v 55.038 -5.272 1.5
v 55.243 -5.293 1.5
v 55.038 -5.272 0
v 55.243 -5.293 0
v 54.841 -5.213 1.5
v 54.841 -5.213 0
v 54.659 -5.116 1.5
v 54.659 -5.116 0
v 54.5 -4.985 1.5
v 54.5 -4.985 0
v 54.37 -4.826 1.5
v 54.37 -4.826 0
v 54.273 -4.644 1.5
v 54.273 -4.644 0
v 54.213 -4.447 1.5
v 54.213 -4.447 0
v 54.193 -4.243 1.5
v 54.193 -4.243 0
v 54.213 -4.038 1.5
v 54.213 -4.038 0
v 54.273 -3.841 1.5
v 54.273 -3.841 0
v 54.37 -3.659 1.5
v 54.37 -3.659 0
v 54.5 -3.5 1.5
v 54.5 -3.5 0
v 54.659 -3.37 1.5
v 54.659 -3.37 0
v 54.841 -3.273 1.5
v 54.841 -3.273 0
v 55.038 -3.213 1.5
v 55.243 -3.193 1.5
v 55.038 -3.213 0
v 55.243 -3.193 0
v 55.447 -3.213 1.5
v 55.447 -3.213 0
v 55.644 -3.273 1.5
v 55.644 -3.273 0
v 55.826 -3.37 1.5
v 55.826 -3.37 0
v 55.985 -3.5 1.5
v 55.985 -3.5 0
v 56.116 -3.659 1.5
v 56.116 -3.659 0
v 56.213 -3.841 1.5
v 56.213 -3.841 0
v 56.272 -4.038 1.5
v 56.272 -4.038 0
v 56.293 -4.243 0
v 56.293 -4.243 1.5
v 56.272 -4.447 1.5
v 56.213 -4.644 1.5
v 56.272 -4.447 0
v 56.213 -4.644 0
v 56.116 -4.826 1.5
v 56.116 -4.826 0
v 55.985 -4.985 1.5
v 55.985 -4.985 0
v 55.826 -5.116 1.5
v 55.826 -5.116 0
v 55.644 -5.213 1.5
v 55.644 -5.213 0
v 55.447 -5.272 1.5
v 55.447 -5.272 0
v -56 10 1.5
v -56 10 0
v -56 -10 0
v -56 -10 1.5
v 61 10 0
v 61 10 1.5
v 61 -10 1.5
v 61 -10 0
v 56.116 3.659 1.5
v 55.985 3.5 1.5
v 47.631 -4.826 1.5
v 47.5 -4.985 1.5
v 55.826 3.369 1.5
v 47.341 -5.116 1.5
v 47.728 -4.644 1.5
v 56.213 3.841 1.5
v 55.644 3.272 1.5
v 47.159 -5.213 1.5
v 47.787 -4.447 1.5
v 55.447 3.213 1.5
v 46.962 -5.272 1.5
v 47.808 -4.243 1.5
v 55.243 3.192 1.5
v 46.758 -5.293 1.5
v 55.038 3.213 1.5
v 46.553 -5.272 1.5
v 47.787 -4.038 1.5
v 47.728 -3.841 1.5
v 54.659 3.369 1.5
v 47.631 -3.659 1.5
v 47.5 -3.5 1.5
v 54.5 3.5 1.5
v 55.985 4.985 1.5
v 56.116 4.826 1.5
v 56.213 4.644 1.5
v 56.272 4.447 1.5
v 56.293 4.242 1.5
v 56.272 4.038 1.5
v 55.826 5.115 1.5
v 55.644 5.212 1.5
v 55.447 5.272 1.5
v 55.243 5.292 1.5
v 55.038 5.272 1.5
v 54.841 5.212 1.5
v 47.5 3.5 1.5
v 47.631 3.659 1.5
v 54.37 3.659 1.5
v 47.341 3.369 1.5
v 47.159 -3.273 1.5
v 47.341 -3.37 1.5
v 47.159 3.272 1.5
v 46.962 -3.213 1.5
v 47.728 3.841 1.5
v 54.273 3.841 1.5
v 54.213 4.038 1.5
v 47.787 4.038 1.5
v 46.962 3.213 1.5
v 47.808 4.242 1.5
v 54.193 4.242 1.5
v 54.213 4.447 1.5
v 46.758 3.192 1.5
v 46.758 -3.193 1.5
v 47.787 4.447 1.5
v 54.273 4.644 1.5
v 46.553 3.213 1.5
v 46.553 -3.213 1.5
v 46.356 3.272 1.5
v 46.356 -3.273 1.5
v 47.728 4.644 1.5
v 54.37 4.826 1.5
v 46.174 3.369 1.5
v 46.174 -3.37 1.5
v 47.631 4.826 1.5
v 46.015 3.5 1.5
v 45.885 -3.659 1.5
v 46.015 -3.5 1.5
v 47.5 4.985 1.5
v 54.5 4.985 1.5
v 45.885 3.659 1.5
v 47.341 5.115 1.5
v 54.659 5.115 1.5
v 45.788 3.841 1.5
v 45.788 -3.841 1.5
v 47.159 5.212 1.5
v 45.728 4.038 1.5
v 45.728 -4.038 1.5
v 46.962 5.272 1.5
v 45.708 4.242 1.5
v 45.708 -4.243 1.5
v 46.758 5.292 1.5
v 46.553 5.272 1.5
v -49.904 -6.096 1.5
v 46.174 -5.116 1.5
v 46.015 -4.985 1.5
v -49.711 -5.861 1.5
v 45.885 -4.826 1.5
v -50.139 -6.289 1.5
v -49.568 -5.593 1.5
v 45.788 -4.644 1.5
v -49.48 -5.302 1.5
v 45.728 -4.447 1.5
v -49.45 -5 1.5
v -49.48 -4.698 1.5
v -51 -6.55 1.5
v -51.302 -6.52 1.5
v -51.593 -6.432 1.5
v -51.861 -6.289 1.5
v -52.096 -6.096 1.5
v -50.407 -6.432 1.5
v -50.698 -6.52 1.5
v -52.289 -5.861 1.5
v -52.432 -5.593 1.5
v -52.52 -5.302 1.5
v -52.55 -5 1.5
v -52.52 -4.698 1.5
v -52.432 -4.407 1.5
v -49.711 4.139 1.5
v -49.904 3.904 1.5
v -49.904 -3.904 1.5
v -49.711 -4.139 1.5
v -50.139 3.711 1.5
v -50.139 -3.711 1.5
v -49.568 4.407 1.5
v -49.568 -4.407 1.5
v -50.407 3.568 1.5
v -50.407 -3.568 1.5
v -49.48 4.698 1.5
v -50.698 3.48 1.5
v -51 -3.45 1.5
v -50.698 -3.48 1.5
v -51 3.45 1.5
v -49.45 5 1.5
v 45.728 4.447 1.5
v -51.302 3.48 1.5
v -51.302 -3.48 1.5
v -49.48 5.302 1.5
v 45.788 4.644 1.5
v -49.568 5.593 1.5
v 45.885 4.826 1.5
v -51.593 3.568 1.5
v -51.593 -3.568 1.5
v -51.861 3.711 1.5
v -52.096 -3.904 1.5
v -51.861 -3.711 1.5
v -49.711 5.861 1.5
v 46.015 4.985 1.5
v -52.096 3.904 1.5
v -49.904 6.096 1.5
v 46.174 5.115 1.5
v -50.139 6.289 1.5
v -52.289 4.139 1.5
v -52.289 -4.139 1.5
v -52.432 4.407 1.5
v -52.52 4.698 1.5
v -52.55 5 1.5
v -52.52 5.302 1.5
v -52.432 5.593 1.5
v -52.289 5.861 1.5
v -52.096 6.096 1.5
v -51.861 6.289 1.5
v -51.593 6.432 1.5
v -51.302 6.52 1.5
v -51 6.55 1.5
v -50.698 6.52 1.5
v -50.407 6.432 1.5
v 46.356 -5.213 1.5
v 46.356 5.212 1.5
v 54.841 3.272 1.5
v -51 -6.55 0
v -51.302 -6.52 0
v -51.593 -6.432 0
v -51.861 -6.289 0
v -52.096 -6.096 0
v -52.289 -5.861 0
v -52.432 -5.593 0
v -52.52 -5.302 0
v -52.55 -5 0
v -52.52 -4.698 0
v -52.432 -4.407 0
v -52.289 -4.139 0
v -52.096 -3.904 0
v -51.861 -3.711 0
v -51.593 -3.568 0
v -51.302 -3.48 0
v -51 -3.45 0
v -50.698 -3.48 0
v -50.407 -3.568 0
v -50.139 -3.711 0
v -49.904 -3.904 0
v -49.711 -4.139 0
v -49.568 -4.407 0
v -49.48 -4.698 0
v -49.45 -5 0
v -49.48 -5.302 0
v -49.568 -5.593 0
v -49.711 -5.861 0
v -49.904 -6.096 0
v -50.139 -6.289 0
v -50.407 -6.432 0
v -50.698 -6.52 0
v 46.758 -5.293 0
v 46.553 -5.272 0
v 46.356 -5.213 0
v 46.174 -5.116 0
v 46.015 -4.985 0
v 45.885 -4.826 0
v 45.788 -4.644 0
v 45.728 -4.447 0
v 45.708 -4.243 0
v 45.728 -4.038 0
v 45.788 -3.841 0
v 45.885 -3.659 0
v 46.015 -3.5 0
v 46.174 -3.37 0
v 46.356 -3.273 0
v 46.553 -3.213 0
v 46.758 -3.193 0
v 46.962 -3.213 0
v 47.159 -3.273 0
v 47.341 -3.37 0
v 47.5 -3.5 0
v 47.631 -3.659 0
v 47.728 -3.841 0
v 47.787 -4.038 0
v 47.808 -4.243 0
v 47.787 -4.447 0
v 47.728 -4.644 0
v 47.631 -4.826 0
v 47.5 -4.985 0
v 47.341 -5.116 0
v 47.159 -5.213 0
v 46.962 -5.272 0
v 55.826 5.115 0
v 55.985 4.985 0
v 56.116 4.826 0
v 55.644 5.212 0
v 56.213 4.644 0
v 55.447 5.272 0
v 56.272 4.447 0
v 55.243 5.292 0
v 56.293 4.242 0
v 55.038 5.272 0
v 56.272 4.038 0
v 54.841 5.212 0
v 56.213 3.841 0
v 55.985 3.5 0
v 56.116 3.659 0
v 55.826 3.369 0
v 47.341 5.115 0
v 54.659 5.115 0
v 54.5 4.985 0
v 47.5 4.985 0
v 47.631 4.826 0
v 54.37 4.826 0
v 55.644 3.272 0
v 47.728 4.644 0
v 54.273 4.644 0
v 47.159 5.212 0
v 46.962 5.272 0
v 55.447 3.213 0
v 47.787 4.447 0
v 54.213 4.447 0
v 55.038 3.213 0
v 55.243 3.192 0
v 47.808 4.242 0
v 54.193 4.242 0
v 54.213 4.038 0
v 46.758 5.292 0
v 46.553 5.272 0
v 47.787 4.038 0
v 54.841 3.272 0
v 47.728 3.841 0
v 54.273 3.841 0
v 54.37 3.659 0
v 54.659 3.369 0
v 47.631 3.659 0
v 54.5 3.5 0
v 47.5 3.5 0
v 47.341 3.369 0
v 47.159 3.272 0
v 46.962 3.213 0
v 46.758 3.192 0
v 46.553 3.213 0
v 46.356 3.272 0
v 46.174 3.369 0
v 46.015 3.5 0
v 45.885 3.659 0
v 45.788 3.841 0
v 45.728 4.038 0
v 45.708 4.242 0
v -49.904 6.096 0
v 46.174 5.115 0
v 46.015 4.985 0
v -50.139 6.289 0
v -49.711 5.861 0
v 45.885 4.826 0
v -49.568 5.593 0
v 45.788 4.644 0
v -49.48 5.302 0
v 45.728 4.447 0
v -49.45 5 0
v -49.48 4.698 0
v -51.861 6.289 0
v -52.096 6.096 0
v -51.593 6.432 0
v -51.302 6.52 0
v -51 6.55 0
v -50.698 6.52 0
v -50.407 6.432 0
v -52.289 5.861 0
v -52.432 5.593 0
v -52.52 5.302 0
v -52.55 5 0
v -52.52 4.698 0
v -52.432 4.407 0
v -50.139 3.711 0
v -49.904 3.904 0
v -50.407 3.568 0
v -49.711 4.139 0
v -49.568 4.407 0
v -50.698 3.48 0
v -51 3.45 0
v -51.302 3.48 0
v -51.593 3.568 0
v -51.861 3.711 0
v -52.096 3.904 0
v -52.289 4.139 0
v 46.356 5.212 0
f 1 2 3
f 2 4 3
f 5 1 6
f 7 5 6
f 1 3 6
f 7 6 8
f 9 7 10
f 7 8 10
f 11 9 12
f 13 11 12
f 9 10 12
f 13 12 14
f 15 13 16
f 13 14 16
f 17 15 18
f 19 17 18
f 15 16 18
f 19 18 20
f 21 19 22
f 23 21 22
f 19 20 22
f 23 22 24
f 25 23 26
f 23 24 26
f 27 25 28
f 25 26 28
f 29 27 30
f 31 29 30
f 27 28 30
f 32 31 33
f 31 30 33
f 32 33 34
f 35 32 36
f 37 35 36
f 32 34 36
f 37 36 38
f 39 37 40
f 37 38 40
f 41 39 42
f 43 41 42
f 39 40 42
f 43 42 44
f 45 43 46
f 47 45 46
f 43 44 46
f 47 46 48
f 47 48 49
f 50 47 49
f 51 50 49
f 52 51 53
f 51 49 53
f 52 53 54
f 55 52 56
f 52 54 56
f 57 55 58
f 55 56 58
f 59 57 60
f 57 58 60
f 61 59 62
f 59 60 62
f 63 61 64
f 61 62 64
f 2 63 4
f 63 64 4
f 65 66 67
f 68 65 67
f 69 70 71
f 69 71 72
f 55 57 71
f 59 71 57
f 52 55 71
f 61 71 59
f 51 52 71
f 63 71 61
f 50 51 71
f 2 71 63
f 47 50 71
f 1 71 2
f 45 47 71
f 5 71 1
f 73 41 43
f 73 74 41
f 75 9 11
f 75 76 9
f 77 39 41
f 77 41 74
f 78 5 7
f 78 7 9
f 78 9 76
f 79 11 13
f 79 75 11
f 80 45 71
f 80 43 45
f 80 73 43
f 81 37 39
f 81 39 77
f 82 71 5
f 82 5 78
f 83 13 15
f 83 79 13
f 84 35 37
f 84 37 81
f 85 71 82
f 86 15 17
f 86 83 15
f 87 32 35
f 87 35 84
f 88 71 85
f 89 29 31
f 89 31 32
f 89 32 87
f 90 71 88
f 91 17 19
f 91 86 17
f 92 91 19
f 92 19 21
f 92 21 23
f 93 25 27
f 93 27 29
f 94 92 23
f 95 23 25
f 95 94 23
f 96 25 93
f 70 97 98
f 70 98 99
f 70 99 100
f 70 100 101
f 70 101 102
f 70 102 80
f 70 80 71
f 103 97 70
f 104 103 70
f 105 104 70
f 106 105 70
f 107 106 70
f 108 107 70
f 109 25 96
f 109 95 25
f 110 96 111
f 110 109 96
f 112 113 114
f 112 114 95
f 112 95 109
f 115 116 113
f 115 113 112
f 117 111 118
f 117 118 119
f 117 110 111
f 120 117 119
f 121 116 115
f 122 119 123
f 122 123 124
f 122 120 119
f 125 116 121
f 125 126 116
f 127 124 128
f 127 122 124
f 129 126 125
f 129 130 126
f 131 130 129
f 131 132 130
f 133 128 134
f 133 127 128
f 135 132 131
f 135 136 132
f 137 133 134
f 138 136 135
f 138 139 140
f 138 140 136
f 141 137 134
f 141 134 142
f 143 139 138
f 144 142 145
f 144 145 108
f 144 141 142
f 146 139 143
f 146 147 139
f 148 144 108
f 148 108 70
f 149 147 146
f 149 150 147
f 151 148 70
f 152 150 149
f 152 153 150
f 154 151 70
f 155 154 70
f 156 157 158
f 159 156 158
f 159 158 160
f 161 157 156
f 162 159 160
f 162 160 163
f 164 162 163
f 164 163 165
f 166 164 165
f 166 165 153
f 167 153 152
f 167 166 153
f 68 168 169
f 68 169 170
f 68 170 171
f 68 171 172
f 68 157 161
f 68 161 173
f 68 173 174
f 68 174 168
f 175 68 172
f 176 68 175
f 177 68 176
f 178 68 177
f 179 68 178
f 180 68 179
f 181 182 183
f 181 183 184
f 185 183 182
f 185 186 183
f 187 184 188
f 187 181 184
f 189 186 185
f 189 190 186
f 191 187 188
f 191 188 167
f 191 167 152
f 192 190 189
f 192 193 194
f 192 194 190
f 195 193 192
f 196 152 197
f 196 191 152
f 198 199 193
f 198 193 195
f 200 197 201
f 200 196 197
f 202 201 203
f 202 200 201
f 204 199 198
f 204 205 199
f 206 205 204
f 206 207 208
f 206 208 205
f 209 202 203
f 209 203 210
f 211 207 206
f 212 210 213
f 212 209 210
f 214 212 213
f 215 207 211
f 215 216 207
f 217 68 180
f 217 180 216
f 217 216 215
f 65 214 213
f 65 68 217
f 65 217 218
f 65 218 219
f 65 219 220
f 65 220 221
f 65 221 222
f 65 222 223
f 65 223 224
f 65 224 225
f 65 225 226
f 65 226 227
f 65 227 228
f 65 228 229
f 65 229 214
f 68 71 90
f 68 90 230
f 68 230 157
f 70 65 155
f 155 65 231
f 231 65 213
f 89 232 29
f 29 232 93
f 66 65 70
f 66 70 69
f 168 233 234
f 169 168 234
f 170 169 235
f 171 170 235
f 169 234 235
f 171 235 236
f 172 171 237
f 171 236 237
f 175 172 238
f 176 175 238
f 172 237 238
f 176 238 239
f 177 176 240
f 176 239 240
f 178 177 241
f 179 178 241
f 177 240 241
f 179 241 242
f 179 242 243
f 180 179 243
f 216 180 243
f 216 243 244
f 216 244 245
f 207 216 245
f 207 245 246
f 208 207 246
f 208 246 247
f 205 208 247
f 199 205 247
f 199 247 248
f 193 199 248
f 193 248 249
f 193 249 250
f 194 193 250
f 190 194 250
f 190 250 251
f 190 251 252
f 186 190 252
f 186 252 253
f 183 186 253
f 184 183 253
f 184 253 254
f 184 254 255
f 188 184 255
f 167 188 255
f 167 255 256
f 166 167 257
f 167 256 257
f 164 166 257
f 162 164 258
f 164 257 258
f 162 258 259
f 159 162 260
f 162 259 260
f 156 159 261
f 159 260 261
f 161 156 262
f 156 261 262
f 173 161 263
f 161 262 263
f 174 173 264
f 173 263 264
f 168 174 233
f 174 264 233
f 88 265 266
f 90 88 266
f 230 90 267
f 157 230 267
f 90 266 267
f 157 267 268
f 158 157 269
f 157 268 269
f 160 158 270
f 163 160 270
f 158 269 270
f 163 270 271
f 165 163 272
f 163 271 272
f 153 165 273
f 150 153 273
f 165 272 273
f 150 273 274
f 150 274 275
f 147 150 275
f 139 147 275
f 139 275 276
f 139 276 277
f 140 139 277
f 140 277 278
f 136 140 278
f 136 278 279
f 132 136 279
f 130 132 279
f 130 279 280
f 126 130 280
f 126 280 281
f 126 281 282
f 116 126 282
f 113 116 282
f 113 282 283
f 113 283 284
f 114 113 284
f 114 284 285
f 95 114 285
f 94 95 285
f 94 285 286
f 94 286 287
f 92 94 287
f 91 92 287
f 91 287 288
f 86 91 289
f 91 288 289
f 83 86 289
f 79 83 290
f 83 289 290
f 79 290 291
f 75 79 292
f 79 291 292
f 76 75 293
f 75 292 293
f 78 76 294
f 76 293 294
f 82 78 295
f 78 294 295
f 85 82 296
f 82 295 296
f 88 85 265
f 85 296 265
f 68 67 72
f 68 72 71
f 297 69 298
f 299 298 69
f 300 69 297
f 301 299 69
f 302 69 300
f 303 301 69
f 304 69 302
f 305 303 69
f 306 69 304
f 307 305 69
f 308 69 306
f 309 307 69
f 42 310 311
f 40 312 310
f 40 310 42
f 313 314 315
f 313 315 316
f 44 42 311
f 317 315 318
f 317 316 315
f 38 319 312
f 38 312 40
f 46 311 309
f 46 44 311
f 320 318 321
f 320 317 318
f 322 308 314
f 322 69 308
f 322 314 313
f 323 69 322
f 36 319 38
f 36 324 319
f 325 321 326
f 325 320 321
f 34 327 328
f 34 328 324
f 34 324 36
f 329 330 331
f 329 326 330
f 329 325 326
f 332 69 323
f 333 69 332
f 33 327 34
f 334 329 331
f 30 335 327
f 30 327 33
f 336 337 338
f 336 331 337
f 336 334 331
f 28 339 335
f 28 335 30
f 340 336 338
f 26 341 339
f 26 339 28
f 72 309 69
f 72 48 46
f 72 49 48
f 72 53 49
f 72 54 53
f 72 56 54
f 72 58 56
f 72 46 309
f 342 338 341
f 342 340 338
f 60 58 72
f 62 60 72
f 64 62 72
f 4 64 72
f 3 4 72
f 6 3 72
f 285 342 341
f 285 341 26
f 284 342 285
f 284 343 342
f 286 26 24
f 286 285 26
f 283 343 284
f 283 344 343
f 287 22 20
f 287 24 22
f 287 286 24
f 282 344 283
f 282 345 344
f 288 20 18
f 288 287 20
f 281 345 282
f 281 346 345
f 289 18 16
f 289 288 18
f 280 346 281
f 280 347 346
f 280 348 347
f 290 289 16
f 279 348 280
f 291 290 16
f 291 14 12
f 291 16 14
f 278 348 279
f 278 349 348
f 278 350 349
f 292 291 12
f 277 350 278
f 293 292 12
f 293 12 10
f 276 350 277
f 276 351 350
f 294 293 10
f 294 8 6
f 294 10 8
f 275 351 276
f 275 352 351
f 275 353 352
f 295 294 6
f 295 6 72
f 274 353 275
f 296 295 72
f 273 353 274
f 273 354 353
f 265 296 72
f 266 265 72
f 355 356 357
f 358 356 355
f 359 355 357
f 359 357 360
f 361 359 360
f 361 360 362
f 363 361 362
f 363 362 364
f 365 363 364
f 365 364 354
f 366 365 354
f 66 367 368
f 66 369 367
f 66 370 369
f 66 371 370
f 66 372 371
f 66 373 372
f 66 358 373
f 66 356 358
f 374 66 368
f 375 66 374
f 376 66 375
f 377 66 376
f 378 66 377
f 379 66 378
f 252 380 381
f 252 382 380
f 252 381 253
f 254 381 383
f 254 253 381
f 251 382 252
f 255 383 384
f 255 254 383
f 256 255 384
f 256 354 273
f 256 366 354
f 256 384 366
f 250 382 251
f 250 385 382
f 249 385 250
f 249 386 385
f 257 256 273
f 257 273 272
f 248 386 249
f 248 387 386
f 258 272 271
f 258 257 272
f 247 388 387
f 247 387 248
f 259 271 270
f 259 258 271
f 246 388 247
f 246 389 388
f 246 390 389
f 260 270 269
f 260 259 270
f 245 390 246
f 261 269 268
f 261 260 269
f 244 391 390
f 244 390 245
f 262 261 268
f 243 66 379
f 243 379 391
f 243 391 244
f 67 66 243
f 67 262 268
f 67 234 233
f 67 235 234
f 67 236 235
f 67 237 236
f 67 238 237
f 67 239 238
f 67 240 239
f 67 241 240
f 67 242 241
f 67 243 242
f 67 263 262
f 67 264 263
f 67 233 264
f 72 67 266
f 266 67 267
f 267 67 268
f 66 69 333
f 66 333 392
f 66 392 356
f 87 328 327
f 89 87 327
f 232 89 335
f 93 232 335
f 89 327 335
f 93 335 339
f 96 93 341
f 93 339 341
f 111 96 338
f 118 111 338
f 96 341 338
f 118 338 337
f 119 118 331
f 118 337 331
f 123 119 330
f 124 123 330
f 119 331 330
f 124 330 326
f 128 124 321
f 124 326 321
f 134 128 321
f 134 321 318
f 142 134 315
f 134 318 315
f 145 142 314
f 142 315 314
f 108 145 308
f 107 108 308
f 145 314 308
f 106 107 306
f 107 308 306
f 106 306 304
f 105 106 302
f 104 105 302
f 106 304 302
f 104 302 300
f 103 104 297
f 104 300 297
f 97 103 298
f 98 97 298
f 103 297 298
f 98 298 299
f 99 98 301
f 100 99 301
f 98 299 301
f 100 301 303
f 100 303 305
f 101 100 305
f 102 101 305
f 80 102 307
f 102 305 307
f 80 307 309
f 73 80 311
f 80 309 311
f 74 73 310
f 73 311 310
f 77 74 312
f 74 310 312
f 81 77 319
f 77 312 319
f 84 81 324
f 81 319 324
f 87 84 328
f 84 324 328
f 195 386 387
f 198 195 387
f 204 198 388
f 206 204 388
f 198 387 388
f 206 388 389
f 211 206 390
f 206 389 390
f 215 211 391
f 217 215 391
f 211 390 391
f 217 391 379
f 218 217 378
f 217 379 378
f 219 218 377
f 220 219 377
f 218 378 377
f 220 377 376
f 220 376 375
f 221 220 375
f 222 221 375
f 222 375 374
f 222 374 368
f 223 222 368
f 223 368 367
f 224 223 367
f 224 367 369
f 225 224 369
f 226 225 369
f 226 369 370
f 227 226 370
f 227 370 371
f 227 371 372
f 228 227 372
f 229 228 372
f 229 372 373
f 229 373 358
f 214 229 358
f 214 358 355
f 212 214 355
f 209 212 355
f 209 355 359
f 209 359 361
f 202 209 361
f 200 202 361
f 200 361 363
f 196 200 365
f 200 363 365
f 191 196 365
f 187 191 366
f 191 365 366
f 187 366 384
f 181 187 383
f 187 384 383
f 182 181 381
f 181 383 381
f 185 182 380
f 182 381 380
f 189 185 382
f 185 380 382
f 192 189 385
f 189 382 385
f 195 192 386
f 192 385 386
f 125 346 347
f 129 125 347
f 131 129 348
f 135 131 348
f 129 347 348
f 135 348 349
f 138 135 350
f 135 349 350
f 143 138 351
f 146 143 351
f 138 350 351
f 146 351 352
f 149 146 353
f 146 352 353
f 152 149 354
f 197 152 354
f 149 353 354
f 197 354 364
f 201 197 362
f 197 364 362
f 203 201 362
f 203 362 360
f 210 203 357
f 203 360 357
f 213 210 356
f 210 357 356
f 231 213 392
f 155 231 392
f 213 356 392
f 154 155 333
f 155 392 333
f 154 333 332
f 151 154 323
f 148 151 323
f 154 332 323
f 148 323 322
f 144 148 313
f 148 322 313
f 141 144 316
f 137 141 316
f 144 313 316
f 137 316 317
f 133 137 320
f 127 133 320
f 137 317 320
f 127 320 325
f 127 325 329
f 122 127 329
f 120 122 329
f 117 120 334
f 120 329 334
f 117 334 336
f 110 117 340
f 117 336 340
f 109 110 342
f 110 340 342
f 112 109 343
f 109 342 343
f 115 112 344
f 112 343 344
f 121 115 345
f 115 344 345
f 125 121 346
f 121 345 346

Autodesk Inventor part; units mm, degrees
ref_plane "YZ Plane" through (0, 0, 0) normal (1, 0, 0) x (0, 1, 0)
ref_plane "XZ Plane" through (0, 0, 0) normal (0, 1, 0) x (-1, 0, 0)
ref_plane "XY Plane" through (0, 0, 0) normal (0, 0, 1) x (1, 0, 0)
sketch "スケッチ1" plane through (0, 0, 0) normal (0, 0, 1) x (1, 0, 0)
  line L0 (56, 10) -> (-56, 10)
  line L1 (-56, 10) -> (-56, -10)
  line L2 (-56, -10) -> (56, -10)
  line L3 (56, -10) -> (56, 10)
  line L4 (56, 10) -> (-56, -10) construction
  line L5 (-56, 10) -> (56, -10) construction
  point P0 (0, 0)
  dimension "d0" = 112
  dimension "d1" = 20
extrude "押し出し1" add sketch "スケッチ1" along normal blind 1.5
sketch "スケッチ3" plane through (0, 0, 1.5) normal (0, 0, 1) x (1, 0, 0)
  line L0 (56, 10) -> (-56, 10) projected
  line L1 (-56, 10) -> (-56, -10) projected
  point P0 (0, 0)
  point P1 (-51, 5)
  point P2 (-51, -5)
  dimension "d10" = 10
  dimension "d11" = 5
  dimension "d12" = 5
hole "穴1" at (-51, 5, 1.5) at (-51, -5, 1.5) direction (0, 0, -1) diameter 3.1 end through all
sketch "スケッチ7" plane through (56, -10, 0) normal (1, 0, 0) x (0, 0, -1)
  line L0 (-1.5, 20) -> (0, 20)
  line L1 (0, 20) -> (0, 0)
  line L2 (0, 0) -> (-1.5, 0)
  line L3 (-1.5, 0) -> (-1.5, 20)
  point P0 (0, 10)
extrude "押し出し3" add sketch "スケッチ7" along normal blind 5
sketch "スケッチ8" plane through (0, 0, 1.5) normal (0, 0, 1) x (1, 0, 0)
  line L0 (55.2426, -4.2426) -> (51, 0)
  line L1 (55.2426, -4.2426) -> (61.2426, -4.2426) construction
  line L2 (61, 10) -> (61, -10) projected
  line L3 (-56, -10) -> (61, -10) projected
  point P0 (0, 0)
  point P1 (55.2426, 4.2424)
  point P2 (46.7576, 4.2424)
  point P3 (46.7576, -4.2426)
  dimension "d38" = 6
  dimension "d39" = 135
  dimension "d40" = 10
  dimension "d41" = 10
  dimension "d52" = 8.485
  dimension "d53" = 8.485
hole "穴4" at (55.2426, -4.2426, 1.5) at (46.7576, -4.2426, 1.5) at (46.7576, 4.2424, 1.5) at (55.2426, 4.2424, 1.5) direction (0, 0, -1) diameter 2.1 end through all
properties part number "Fork 4 right ver2.1" material "アルミニウム 5052 H32"
